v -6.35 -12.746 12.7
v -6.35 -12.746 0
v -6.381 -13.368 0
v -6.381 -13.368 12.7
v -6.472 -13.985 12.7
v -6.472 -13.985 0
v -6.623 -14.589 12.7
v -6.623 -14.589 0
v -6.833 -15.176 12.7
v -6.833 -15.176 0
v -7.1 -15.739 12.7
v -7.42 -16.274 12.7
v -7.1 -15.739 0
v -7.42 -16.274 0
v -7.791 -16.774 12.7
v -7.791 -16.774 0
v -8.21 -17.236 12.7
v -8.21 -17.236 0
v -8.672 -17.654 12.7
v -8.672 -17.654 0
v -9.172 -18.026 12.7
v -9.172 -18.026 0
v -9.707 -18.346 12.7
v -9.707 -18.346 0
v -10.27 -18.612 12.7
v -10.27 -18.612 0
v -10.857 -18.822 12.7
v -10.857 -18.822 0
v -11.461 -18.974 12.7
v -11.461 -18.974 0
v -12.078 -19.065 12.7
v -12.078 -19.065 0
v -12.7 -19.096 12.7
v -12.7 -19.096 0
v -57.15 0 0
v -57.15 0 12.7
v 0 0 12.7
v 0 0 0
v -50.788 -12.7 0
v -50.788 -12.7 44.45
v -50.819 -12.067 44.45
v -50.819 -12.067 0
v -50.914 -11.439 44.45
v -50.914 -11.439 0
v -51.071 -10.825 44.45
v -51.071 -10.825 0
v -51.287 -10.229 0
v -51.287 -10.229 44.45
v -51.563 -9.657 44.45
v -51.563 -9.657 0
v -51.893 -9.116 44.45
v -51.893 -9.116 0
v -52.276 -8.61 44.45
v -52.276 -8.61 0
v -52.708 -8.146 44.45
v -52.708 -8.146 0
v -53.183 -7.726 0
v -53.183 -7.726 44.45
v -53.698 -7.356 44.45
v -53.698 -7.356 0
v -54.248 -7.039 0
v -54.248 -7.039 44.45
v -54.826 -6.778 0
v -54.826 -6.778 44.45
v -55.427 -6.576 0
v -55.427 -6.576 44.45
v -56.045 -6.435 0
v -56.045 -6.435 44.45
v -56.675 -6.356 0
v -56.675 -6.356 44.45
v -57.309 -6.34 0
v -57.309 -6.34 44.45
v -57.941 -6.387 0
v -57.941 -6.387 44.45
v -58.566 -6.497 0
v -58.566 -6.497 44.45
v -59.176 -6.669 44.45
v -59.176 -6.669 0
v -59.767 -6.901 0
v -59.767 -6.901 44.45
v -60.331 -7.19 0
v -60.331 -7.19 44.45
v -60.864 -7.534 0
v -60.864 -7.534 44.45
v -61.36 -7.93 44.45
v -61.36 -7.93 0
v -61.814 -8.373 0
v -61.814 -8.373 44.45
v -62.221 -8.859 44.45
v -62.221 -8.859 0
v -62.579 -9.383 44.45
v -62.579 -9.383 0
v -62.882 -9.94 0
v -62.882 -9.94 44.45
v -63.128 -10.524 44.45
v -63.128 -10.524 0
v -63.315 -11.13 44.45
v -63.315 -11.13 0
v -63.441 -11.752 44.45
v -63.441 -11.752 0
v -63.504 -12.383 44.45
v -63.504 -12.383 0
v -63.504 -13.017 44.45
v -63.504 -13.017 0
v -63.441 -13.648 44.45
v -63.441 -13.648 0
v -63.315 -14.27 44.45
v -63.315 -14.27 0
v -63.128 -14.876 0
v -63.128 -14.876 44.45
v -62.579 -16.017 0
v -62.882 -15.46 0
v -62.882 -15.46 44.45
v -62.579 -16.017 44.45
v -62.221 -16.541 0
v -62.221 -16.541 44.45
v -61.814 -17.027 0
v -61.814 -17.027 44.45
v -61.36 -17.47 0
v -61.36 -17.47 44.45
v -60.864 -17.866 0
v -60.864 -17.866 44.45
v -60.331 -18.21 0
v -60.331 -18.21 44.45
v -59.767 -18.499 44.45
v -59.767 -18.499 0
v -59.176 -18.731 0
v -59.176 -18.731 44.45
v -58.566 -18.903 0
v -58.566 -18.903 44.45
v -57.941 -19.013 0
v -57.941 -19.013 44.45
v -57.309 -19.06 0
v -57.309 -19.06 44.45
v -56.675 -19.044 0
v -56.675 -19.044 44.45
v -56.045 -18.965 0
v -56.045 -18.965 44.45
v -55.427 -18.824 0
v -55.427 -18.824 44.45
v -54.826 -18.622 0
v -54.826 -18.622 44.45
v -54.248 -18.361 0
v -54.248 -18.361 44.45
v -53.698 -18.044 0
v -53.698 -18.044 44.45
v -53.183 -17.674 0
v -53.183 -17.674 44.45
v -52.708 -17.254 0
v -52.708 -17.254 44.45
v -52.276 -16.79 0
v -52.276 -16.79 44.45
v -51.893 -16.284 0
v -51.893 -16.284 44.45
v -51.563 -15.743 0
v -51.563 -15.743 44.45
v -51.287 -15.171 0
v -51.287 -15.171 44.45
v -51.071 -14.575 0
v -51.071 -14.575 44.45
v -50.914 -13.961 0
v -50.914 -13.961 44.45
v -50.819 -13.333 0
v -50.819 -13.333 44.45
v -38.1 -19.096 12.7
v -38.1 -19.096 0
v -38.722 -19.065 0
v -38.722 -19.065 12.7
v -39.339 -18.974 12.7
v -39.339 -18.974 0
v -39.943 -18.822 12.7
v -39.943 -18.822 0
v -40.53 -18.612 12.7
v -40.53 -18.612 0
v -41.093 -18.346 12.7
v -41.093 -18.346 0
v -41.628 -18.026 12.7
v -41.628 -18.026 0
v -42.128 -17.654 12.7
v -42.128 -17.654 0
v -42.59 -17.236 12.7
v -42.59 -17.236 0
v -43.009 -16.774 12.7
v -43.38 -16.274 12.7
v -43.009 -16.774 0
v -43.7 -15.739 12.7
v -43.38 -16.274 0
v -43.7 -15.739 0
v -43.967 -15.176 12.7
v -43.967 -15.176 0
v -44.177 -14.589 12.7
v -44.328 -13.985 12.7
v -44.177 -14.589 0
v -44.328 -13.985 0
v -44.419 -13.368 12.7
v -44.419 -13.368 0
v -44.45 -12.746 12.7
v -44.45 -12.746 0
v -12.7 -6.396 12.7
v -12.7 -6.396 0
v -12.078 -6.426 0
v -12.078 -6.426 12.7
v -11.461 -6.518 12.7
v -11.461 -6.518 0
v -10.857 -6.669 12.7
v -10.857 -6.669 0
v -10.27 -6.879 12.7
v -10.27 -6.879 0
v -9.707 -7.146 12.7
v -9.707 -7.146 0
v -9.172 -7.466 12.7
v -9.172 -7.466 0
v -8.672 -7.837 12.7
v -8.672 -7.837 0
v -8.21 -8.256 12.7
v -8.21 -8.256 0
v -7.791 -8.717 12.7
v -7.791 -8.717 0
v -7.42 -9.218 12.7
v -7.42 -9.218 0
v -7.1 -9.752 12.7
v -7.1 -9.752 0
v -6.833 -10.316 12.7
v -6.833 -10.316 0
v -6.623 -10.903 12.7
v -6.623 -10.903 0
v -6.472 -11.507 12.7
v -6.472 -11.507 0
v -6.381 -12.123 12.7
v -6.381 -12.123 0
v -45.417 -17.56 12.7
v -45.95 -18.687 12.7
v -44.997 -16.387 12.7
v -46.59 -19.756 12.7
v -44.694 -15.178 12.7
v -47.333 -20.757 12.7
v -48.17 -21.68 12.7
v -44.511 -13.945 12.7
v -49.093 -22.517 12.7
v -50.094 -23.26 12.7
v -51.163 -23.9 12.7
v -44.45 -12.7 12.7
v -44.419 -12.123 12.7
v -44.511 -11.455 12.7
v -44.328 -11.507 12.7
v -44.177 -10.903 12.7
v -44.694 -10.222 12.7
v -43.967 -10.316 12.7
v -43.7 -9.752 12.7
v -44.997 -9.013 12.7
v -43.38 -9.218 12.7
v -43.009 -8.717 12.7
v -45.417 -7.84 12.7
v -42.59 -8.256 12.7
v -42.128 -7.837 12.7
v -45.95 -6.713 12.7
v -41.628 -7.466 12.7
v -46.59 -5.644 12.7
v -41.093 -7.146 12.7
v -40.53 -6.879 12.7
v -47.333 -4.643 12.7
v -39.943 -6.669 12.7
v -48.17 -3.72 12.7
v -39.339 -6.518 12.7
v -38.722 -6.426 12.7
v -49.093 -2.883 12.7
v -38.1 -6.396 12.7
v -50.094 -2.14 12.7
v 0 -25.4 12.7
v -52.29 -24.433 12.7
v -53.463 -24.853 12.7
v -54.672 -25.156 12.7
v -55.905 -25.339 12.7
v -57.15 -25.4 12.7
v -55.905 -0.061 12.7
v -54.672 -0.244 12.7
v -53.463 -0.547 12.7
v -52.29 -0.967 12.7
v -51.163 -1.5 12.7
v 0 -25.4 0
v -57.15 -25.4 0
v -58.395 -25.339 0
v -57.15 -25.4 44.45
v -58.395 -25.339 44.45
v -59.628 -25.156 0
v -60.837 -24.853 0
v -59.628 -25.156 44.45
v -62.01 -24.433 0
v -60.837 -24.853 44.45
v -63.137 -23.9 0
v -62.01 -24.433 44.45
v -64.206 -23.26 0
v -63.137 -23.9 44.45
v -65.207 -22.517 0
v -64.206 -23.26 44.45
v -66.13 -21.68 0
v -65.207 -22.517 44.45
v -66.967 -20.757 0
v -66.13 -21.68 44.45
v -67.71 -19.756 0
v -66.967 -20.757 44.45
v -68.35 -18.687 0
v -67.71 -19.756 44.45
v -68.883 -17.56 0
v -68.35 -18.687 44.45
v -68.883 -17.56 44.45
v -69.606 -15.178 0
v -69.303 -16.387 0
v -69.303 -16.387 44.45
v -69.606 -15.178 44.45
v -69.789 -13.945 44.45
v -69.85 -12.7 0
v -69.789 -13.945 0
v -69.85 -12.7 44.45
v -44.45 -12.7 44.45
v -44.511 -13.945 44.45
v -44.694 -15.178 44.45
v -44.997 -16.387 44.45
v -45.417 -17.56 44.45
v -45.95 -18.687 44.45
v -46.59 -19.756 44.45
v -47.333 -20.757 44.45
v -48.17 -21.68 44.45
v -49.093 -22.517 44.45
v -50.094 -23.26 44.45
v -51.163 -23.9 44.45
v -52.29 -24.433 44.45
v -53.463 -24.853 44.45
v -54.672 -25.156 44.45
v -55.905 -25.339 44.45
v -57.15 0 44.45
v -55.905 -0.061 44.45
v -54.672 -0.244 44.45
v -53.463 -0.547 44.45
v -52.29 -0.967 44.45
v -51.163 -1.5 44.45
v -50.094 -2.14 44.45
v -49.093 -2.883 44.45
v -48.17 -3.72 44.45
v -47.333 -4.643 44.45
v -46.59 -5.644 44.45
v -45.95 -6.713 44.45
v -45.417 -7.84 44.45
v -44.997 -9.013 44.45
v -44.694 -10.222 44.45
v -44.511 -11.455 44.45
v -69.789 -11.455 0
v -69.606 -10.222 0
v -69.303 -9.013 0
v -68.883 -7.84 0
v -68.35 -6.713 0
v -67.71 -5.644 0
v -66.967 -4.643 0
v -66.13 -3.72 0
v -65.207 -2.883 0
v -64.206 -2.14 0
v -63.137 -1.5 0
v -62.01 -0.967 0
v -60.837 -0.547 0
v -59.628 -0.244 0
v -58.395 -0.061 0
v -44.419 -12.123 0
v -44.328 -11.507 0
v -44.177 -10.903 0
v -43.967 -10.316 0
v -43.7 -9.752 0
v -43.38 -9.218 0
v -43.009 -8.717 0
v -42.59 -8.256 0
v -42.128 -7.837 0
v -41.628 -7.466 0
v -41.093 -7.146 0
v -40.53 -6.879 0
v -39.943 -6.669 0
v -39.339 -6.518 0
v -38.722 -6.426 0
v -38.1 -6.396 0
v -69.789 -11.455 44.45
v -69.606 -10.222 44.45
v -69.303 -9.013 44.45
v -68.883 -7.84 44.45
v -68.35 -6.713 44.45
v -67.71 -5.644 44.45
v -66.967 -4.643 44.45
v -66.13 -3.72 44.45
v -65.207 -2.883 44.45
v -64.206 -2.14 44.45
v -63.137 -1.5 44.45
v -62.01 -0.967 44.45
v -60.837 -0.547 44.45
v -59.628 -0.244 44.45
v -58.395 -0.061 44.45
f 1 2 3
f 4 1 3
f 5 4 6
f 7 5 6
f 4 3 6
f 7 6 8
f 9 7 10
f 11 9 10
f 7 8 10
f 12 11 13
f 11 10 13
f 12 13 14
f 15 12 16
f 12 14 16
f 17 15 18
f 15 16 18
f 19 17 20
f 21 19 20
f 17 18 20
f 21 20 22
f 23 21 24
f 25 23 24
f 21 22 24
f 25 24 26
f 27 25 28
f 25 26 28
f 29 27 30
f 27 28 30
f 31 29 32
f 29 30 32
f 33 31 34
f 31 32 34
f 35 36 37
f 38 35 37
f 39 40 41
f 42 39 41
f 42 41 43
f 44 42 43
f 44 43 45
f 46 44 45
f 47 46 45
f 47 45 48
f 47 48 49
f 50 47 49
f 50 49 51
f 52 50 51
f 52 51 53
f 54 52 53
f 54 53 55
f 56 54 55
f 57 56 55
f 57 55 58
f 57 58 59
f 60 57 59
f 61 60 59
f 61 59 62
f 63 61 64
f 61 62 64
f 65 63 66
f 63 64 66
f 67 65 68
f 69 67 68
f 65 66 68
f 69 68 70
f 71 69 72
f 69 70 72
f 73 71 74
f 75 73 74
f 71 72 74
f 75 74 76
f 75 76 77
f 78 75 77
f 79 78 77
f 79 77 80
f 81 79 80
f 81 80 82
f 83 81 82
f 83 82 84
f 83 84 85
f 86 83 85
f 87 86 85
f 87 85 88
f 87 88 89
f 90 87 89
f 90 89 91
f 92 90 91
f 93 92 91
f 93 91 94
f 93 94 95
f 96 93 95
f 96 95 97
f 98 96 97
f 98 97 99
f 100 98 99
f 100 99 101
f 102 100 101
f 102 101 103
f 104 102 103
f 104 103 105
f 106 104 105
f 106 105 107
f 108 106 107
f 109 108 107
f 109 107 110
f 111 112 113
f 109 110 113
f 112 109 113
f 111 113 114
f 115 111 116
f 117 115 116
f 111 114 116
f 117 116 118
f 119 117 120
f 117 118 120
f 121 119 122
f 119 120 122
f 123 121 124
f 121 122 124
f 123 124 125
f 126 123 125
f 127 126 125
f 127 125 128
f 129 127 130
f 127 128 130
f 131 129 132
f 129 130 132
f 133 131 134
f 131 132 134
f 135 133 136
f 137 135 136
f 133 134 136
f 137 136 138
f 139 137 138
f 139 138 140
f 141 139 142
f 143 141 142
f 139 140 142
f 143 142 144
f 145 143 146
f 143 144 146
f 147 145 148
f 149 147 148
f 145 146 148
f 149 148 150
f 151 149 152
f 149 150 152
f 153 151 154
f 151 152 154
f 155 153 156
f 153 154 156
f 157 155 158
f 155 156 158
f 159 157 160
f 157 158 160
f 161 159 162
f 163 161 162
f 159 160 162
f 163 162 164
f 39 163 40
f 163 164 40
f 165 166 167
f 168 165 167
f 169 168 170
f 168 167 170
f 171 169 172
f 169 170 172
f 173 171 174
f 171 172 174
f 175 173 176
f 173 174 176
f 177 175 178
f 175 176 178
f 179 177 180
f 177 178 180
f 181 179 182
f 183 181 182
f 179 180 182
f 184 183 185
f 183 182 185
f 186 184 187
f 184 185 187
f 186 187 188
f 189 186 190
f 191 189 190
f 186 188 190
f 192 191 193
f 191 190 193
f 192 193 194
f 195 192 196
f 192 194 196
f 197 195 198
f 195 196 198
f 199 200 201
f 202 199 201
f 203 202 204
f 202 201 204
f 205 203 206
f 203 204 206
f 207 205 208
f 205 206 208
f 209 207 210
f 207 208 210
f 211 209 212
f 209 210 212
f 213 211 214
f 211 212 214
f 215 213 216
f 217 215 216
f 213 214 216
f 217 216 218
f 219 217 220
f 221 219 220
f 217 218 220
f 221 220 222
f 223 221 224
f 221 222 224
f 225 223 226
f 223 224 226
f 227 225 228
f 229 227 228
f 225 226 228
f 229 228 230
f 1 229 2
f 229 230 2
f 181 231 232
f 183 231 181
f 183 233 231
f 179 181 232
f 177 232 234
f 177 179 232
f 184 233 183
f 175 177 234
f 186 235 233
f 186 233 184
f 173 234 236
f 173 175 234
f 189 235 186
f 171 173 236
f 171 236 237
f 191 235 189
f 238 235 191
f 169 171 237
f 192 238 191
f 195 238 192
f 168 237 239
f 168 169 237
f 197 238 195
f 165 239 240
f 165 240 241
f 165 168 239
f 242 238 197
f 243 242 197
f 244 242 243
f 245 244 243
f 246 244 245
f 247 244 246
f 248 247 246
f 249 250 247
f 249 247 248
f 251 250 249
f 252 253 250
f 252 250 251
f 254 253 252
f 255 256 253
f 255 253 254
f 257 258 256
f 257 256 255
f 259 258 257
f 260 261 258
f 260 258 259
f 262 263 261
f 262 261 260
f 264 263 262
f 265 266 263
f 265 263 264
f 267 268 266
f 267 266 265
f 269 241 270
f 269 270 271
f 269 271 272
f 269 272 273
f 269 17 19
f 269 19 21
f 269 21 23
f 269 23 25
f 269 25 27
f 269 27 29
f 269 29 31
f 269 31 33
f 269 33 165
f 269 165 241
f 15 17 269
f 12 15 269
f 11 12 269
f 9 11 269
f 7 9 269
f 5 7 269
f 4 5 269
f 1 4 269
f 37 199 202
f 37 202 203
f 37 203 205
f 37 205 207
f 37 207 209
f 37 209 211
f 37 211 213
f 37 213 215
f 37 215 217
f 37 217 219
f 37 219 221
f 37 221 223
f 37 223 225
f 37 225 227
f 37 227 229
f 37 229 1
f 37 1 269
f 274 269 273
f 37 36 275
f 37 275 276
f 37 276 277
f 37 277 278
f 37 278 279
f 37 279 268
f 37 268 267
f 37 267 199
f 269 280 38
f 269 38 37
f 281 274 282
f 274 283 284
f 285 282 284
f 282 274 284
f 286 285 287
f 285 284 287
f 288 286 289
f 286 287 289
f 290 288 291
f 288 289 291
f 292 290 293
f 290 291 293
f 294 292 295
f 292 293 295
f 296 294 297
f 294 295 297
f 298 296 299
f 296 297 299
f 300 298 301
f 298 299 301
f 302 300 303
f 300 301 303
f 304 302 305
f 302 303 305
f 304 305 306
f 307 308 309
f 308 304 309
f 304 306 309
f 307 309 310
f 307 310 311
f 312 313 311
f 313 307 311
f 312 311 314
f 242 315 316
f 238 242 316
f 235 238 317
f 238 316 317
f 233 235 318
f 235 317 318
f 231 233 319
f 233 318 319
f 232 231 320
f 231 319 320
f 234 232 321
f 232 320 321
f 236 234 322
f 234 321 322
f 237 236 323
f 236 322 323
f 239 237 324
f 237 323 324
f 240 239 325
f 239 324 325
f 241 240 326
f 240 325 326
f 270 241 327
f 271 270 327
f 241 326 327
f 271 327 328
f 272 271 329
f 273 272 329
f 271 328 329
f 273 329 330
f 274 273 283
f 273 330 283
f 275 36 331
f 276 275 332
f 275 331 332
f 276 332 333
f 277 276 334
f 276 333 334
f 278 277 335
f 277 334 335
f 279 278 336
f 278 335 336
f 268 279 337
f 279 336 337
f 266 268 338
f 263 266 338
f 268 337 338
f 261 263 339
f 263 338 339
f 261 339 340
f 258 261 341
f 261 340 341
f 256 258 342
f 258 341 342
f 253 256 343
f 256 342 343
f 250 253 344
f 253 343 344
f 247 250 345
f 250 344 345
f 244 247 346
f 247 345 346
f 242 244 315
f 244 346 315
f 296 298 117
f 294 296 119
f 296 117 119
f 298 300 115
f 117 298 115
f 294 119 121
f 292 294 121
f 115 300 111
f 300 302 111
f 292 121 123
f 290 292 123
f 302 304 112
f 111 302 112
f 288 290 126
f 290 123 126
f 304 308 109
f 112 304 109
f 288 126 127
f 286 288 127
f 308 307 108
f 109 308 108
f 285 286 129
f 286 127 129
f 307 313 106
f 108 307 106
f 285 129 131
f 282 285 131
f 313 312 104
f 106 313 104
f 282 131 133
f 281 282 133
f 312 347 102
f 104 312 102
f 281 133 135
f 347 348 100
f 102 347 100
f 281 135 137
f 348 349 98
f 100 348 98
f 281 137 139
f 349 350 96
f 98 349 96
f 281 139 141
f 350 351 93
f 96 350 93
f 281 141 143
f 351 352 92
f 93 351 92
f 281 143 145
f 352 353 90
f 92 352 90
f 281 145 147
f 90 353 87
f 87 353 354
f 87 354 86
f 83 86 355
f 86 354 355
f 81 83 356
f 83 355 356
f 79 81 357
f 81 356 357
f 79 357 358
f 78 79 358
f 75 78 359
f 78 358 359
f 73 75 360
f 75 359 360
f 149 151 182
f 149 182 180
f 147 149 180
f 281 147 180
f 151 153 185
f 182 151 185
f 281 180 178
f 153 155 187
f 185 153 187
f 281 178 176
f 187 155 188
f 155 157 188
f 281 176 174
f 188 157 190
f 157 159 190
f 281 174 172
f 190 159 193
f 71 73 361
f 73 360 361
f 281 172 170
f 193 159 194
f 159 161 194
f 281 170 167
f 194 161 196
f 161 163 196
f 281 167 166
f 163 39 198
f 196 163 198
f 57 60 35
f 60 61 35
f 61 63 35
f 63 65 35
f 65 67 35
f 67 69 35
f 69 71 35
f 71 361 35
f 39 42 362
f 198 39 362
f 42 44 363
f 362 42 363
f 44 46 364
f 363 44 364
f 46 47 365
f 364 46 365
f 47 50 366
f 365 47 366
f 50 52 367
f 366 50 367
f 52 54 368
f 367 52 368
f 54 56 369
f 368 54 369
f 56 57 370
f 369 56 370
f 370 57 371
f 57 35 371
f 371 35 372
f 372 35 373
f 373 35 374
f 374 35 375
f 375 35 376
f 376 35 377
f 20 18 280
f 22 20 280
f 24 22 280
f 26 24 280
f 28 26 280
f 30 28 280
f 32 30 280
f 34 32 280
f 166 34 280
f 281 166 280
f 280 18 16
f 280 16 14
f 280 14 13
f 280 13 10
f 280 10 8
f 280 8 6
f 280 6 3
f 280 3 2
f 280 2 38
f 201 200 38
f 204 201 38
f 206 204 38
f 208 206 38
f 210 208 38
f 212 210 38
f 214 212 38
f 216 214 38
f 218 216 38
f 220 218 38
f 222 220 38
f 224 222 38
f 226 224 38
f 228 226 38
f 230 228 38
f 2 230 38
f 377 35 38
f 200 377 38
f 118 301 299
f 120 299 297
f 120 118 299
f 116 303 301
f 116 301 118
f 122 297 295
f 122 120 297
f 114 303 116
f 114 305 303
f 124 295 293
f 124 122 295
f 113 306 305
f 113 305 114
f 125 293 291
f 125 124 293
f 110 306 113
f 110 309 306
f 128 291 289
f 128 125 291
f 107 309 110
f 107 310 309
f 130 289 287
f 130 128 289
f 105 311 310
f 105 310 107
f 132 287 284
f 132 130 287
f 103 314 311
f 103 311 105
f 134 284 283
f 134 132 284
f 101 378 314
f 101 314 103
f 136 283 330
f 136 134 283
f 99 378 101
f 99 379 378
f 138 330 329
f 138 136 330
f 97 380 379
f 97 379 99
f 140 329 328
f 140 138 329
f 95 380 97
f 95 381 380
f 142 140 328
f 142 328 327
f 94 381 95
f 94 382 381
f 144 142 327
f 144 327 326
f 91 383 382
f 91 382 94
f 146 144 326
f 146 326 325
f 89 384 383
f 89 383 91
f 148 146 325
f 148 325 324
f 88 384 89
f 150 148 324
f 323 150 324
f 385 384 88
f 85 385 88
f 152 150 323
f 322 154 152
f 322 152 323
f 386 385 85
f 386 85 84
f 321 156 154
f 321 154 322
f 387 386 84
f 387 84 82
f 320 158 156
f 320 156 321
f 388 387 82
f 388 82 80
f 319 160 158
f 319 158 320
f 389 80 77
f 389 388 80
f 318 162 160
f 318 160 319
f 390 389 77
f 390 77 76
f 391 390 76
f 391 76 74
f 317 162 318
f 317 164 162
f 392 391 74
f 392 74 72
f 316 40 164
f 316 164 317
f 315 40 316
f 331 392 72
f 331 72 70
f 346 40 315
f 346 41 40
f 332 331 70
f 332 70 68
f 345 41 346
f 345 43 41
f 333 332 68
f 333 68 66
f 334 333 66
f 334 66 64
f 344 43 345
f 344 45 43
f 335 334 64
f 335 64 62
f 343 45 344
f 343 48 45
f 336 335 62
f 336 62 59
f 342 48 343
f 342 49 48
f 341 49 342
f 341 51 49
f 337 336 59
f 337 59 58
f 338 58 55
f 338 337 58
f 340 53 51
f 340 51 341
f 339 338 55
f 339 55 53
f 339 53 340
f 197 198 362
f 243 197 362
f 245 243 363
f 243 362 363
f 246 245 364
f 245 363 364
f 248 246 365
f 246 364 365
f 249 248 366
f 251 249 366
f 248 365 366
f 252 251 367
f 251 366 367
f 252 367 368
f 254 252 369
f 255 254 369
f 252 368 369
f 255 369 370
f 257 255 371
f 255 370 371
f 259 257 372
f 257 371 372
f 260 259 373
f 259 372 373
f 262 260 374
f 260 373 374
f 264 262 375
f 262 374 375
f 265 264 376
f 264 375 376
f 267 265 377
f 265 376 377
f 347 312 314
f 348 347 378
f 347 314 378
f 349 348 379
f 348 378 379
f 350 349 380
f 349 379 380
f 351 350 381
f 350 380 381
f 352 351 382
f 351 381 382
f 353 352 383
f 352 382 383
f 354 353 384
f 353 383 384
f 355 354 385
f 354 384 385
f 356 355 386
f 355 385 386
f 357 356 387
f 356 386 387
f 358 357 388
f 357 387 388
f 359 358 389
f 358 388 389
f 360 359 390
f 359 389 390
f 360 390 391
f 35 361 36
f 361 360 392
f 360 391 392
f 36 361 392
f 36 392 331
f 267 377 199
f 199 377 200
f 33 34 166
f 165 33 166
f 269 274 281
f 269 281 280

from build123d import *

# Parameters (mm, degrees)
F0_W      = 69.85
F0_H      = 44.45
F1_DEPTH  = 25.4
F2_W      = 44.45
F2_H      = 31.75
F3_DEPTH  = 25.401
F5_DEPTH  = 44.451
F7_DEPTH  = 31.75
F9_DEPTH  = 44.451
F10_R     = 6.3621373658
F11_DEPTH = 44.451


with BuildPart() as f1:
    # F0 (on Front) → F1 (new body)
    with BuildSketch(Plane.XZ):
        with Locations((-34.925, 22.225)):
            Rectangle(F0_W, F0_H)
    extrude(amount=F1_DEPTH)

    # F2 (on face) → F3 (cut, through all)
    with BuildSketch(Plane.XZ.offset(25.4)):
        with Locations((-22.225, 28.575)):
            Rectangle(F2_W, F2_H)
    extrude(amount=-F3_DEPTH, mode=Mode.SUBTRACT)

    # F4 (on face) → F5 (cut, through all)
    with BuildSketch(Plane.XY.offset(44.45)):
        with BuildLine():
            ThreePointArc((-69.85, -12.7), (-66.1302561211, -3.7197438789), (-57.15, 0))
            Line((-57.15, 0), (-69.85, 0))
            Line((-69.85, 0), (-69.85, -12.7))
        make_face()
        with BuildLine():
            Line((-69.85, -25.4), (-57.15, -25.4))
            ThreePointArc((-57.15, -25.4), (-66.1302561211, -21.6802561211), (-69.85, -12.7))
            Line((-69.85, -12.7), (-69.85, -25.4))
        make_face()
    extrude(amount=-F5_DEPTH, mode=Mode.SUBTRACT)

    # F6 (on face) → F7 (cut)
    with BuildSketch(Plane.XY.offset(44.45)):
        with BuildLine():
            ThreePointArc((-57.15, 0), (-48.1697438789, -3.7197438789), (-44.45, -12.7))
            Line((-44.45, -12.7), (-44.45, 0))
            Line((-44.45, 0), (-57.15, 0))
        make_face()
        with BuildLine():
            Line((-44.45, -25.4), (-44.45, -12.7))
            ThreePointArc((-44.45, -12.7), (-48.1697438789, -21.6802561211), (-57.15, -25.4))
            Line((-57.15, -25.4), (-44.45, -25.4))
        make_face()
    extrude(amount=-F7_DEPTH, mode=Mode.SUBTRACT)

    # F8 (on face) → F9 (cut, through all)
    with BuildSketch(Plane(origin=(0, 0, 0), x_dir=(1, 0, 0), z_dir=(0, 0, -1))):
        with BuildLine():
            Line((-38.1, 6.3958125417), (-12.7, 6.3958125417))
            ThreePointArc((-12.7, 6.3958125417), (-8.2098719395, 8.2556844811), (-6.35, 12.7458125417))
            ThreePointArc((-6.35, 12.7458125417), (-8.2098719395, 17.2359406022), (-12.7, 19.0958125417))
            Line((-12.7, 19.0958125417), (-38.1, 19.0958125417))
            ThreePointArc((-38.1, 19.0958125417), (-42.5901280605, 17.2359406022), (-44.45, 12.7458125417))
            ThreePointArc((-44.45, 12.7458125417), (-42.5901280605, 8.2556844811), (-38.1, 6.3958125417))
        make_face()
    extrude(amount=-F9_DEPTH, mode=Mode.SUBTRACT)

    # F10 (on face) → F11 (cut, through all)
    with BuildSketch(Plane.XY.offset(44.45)):
        with Locations((-57.15, -12.7)):
            Circle(F10_R)
    extrude(amount=-F11_DEPTH, mode=Mode.SUBTRACT)


solid = f1.part
